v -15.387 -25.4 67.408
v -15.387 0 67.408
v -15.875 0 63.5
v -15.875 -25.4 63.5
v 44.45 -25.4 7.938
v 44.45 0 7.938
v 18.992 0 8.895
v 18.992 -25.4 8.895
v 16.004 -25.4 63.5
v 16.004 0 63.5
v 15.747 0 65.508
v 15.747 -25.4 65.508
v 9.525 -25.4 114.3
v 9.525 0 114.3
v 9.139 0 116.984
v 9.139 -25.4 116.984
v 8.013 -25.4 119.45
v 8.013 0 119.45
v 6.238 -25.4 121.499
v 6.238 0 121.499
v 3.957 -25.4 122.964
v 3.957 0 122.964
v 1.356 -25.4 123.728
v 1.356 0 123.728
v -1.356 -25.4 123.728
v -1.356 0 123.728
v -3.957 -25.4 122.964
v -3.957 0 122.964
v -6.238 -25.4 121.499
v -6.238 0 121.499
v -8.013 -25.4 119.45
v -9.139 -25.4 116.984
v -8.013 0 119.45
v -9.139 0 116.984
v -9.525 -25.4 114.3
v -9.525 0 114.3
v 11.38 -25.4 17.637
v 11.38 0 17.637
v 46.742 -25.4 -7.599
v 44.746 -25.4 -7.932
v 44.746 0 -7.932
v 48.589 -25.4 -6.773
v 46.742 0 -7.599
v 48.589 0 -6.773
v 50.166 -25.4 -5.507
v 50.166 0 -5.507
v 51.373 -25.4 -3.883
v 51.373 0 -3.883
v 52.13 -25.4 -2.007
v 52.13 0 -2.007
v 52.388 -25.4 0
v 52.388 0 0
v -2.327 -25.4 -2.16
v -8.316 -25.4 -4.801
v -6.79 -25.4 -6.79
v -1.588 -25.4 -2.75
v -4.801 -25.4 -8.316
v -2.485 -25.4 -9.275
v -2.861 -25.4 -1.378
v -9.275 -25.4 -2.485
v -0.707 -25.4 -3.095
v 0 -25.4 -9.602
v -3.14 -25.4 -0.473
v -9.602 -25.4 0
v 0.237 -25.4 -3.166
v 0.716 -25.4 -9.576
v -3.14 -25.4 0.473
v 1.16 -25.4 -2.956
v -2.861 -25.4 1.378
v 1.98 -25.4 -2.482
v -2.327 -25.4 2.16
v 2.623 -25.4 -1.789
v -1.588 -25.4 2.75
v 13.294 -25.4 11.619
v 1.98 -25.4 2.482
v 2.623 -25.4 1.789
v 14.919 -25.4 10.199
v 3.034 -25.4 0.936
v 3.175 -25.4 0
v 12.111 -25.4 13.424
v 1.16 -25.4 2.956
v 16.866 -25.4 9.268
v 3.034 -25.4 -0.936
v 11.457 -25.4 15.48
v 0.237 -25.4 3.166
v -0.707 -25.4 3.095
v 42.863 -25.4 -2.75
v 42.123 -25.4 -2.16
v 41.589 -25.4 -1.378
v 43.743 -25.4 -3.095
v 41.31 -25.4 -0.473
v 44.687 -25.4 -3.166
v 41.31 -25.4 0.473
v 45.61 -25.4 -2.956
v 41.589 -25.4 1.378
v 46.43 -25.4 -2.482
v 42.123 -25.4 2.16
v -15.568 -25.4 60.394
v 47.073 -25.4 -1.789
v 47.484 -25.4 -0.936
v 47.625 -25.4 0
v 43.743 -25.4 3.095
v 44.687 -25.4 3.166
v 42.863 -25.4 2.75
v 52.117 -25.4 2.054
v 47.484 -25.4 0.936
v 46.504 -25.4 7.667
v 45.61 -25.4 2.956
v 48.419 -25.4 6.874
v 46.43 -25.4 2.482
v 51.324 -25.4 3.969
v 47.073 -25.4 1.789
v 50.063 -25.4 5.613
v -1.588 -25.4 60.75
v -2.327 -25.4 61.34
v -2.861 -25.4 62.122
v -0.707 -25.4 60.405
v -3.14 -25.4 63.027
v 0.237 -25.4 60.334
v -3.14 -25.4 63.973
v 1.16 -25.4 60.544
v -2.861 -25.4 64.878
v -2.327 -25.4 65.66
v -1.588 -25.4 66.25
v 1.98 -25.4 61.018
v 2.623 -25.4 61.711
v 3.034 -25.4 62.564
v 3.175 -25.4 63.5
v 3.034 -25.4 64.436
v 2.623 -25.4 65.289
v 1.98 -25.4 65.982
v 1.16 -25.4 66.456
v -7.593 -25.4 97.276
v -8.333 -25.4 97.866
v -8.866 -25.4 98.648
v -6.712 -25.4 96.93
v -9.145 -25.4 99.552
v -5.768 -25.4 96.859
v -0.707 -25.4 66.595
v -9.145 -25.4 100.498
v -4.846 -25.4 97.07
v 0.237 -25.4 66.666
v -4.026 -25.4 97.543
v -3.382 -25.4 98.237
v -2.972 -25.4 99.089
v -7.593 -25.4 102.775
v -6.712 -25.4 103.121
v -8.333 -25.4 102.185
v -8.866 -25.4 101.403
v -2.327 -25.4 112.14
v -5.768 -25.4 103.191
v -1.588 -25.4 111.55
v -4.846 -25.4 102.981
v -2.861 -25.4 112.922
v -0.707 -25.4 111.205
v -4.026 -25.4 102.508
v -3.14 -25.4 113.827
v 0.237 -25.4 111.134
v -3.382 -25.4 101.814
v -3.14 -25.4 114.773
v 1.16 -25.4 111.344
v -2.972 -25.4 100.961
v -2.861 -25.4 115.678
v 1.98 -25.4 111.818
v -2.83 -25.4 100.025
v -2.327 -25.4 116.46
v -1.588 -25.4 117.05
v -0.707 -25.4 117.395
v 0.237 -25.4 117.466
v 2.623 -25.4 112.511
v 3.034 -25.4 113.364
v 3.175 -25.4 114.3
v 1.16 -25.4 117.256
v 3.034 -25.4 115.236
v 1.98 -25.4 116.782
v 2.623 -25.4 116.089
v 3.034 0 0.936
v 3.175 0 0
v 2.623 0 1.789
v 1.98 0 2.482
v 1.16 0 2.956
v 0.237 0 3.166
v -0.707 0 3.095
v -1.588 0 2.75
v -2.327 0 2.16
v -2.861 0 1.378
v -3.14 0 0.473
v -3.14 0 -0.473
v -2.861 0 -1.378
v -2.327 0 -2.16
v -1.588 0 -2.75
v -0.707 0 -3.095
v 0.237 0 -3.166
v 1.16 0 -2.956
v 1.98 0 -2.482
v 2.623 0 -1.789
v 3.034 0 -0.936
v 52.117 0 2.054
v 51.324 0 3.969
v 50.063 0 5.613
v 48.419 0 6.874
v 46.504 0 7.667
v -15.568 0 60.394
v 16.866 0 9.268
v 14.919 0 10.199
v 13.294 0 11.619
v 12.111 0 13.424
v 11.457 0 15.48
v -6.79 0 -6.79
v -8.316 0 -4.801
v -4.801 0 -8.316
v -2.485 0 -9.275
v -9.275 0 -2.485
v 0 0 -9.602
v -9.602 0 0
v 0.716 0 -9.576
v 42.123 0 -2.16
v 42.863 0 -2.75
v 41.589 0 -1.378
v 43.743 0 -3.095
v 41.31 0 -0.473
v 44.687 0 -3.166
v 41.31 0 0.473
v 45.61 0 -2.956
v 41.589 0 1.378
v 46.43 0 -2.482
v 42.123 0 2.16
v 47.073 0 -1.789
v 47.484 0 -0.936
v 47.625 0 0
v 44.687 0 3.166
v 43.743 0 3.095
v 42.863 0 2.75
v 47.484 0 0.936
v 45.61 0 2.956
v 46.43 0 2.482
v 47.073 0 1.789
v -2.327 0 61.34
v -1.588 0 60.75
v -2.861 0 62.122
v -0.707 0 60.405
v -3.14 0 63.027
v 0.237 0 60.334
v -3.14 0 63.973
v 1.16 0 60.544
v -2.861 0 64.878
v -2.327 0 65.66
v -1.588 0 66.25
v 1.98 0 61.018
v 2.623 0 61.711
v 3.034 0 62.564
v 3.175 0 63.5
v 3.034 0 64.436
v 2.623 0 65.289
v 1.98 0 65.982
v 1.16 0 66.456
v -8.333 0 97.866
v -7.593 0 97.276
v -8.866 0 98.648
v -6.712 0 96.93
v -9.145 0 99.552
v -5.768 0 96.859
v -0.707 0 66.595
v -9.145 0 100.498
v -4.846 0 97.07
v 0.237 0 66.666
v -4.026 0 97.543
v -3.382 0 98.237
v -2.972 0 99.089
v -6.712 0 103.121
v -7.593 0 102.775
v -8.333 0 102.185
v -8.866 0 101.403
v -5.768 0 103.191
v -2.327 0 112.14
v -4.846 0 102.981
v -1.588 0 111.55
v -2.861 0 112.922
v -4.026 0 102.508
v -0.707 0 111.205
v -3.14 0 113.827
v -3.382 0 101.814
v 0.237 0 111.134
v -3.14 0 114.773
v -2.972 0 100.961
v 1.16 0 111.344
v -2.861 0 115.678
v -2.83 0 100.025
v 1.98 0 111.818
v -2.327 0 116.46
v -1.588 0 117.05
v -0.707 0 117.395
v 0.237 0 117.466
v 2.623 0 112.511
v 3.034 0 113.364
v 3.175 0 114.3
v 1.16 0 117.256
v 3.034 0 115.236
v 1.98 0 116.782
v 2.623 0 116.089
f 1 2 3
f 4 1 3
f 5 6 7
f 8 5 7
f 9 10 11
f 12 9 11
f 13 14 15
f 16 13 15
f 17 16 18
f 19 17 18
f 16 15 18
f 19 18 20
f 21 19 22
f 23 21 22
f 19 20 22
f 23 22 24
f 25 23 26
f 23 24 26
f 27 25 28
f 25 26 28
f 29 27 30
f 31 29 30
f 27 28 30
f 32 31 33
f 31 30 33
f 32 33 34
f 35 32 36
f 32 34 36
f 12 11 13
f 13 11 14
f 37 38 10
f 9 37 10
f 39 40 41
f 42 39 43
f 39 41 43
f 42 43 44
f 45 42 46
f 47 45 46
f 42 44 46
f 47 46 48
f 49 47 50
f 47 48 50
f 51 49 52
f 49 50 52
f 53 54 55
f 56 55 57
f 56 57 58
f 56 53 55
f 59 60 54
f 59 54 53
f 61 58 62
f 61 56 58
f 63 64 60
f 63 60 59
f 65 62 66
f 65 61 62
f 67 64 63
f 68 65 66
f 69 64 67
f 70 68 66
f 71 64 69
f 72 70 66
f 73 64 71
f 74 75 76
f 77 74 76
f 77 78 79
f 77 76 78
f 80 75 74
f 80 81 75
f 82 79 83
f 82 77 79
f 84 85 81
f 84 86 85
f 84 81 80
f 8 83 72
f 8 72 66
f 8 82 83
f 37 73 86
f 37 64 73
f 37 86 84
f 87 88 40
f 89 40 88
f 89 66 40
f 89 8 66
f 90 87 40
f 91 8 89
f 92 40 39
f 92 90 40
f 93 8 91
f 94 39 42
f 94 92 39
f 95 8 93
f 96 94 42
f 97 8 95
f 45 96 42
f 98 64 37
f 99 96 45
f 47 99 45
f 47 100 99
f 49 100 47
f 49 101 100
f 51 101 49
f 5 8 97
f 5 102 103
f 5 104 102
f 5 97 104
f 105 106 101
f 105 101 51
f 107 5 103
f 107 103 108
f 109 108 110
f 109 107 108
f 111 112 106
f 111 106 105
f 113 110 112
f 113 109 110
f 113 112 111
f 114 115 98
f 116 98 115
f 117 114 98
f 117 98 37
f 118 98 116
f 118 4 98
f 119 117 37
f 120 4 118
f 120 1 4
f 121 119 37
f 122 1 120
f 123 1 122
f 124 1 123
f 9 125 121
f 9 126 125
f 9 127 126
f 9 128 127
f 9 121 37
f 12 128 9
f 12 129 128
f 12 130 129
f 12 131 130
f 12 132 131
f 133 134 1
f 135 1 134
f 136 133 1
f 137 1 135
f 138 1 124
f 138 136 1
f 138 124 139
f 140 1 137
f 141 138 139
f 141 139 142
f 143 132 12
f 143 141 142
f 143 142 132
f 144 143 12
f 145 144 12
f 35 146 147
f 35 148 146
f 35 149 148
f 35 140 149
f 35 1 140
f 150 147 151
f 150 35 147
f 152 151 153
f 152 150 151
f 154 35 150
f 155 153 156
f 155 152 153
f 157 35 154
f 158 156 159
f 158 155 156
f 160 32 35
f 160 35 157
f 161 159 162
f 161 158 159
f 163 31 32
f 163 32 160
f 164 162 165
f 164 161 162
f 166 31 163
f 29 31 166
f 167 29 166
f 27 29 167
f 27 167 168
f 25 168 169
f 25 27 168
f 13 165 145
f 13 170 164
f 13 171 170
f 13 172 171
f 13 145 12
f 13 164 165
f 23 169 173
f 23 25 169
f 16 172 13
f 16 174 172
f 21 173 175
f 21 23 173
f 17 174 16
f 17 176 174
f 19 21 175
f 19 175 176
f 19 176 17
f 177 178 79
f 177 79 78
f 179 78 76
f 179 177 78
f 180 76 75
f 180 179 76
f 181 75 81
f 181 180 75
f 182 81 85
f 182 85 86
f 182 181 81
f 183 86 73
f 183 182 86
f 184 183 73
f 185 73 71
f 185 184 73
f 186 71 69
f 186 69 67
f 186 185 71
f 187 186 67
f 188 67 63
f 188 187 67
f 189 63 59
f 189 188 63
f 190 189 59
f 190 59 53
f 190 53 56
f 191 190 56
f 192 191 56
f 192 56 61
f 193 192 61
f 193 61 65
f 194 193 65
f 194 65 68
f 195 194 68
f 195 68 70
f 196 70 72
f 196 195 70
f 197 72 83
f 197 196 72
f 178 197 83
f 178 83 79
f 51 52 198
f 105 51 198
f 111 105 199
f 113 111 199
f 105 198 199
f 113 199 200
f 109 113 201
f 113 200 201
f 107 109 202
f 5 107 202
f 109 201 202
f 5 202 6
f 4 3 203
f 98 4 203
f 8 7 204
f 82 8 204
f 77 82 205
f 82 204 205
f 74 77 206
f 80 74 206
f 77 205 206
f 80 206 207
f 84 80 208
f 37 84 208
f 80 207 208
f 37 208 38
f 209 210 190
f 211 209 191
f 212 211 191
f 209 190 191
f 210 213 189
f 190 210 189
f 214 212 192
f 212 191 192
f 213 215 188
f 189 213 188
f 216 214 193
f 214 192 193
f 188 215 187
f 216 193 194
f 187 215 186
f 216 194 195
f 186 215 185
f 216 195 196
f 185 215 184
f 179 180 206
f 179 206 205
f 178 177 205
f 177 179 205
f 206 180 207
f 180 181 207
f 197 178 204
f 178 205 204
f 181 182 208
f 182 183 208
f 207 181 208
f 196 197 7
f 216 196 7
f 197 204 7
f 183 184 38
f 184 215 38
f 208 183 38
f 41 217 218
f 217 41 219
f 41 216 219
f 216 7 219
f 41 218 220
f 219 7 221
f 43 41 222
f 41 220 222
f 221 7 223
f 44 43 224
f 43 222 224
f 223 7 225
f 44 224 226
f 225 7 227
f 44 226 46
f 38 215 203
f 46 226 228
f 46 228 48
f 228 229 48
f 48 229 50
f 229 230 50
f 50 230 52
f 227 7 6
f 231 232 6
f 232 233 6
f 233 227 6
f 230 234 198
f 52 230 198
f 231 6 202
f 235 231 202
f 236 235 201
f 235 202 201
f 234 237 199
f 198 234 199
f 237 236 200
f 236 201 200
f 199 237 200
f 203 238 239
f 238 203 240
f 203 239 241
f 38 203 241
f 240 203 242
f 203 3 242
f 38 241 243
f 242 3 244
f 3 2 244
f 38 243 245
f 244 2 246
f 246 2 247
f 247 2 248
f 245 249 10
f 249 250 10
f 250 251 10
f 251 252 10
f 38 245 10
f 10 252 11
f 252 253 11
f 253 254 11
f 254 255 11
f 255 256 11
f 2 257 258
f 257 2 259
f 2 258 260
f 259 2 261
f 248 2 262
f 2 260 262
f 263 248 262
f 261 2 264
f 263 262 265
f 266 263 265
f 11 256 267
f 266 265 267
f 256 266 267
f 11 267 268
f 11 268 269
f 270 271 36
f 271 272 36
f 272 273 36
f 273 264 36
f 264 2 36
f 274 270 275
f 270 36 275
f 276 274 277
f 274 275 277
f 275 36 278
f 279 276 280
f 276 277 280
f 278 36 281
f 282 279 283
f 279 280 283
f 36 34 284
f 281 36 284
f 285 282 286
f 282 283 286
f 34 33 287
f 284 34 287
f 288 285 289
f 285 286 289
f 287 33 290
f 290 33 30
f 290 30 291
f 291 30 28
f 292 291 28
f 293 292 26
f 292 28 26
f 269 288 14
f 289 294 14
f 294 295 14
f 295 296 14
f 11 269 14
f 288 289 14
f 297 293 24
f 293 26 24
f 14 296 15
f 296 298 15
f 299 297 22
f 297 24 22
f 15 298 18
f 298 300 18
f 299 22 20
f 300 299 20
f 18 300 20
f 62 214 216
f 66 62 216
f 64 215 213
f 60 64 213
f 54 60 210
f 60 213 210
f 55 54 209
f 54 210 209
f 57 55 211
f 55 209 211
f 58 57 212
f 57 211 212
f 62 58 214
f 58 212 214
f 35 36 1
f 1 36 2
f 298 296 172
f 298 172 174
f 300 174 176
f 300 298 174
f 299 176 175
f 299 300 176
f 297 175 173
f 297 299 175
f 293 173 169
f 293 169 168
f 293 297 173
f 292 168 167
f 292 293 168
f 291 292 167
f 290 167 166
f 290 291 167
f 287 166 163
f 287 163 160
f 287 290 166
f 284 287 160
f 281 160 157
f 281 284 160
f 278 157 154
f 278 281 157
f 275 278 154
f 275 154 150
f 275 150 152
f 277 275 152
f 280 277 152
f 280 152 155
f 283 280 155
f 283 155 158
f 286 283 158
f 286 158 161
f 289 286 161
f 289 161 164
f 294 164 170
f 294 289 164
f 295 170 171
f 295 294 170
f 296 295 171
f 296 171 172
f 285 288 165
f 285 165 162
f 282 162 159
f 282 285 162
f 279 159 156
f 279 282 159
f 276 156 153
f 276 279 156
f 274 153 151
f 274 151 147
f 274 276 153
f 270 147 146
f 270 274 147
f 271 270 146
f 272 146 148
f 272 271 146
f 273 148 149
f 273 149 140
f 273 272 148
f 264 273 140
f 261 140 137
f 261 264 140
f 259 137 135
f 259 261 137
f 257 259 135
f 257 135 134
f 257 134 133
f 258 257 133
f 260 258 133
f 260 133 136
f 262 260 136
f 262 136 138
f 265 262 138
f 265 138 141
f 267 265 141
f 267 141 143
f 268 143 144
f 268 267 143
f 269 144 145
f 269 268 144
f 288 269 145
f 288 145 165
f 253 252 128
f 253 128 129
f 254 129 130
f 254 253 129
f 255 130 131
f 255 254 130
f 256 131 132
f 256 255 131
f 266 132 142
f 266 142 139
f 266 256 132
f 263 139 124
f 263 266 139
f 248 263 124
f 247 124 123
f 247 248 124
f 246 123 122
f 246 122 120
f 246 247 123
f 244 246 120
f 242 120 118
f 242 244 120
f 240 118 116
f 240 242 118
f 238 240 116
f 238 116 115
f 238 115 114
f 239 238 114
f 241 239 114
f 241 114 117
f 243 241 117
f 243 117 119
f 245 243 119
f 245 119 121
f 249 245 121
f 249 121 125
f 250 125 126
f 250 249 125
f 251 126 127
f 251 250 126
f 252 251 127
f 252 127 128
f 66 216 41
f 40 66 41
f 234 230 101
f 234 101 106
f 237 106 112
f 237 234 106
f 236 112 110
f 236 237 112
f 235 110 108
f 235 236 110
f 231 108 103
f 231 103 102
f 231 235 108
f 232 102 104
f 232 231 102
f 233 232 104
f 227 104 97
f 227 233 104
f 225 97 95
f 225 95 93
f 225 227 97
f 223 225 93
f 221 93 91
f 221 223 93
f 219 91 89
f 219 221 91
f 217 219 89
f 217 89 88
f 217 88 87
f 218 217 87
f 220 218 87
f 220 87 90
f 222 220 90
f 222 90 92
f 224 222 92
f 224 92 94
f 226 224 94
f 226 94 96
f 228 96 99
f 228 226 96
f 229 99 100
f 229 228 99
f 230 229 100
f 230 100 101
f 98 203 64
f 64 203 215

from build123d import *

# Parameters (mm, degrees)
F0_R     = 3.175
F1_DEPTH = 25.4


with BuildPart() as f1:
    # F0 (on Front) → F1 (new body)
    with BuildSketch(Plane.XZ):
        with BuildLine():
            ThreePointArc((-9.602438, 0), (0, 9.602438), (9.602438, 0))
            ThreePointArc((9.602438, 0), (7.038529, -6.531916), (0.715959, -9.57571))
            Line((0.715959, -9.57571), (44.746117, -7.931975))
            ThreePointArc((44.746117, -7.931975), (36.513881, -0.148084), (44.45, 7.9375))
            Line((44.45, 7.9375), (18.991657, 8.894967))
            ThreePointArc((18.991657, 8.894967), (13.294448, 11.619044), (11.380335, 17.636931))
            Line((11.380335, 17.636931), (16.003576, 63.5))
            Line((16.003576, 63.5), (15.747457, 65.508289))
            ThreePointArc((15.747457, 65.508289), (15.843082, 64.506168), (15.875, 63.5))
            ThreePointArc((15.875, 63.5), (1.560545, 47.701889), (-15.56819, 60.394026))
            Line((-15.56819, 60.394026), (-9.602438, 0))
        make_face()
        with BuildLine():
            Line((-9.525, 114.3), (-15.386538, 67.407692))
            ThreePointArc((-15.386538, 67.407692), (0.966695, 79.34554), (15.747457, 65.508289))
            Line((15.747457, 65.508289), (9.525, 114.3))
            ThreePointArc((9.525, 114.3), (0, 104.775), (-9.525, 114.3))
        make_face()
        with Locations((-6.005472, 100.0252)):
            Circle(F0_R, mode=Mode.SUBTRACT)
        with BuildLine():
            Line((-15.875, 63.5), (-15.56819, 60.394026))
            ThreePointArc((-15.56819, 60.394026), (1.560545, 47.701889), (15.875, 63.5))
            ThreePointArc((15.875, 63.5), (15.843082, 64.506168), (15.747457, 65.508289))
            ThreePointArc((15.747457, 65.508289), (0.966695, 79.34554), (-15.386538, 67.407692))
            Line((-15.386538, 67.407692), (-15.875, 63.5))
        make_face()
        with Locations((0, 63.5)):
            Circle(F0_R, mode=Mode.SUBTRACT)
        with BuildLine():
            ThreePointArc((0.715959, -9.57571), (7.038529, -6.531916), (9.602438, 0))
            ThreePointArc((9.602438, 0), (0, 9.602438), (-9.602438, 0))
            ThreePointArc((-9.602438, 0), (-6.789949, -6.789949), (0, -9.602438))
            Line((0, -9.602438), (0.715959, -9.57571))
        make_face()
        Circle(F0_R, mode=Mode.SUBTRACT)
        with BuildLine():
            ThreePointArc((44.45, 7.9375), (36.513881, -0.148084), (44.746117, -7.931975))
            ThreePointArc((44.746117, -7.931975), (50.166395, -5.506972), (52.3875, 0))
            ThreePointArc((52.3875, 0), (50.06266, 5.61266), (44.45, 7.9375))
        make_face()
        with Locations((44.45, 0)):
            Circle(F0_R, mode=Mode.SUBTRACT)
        with BuildLine():
            ThreePointArc((9.525, 114.3), (0, 123.825), (-9.525, 114.3))
            ThreePointArc((-9.525, 114.3), (0, 104.775), (9.525, 114.3))
        make_face()
        with Locations((0, 114.3)):
            Circle(F0_R, mode=Mode.SUBTRACT)
    extrude(amount=F1_DEPTH)


solid = f1.part
